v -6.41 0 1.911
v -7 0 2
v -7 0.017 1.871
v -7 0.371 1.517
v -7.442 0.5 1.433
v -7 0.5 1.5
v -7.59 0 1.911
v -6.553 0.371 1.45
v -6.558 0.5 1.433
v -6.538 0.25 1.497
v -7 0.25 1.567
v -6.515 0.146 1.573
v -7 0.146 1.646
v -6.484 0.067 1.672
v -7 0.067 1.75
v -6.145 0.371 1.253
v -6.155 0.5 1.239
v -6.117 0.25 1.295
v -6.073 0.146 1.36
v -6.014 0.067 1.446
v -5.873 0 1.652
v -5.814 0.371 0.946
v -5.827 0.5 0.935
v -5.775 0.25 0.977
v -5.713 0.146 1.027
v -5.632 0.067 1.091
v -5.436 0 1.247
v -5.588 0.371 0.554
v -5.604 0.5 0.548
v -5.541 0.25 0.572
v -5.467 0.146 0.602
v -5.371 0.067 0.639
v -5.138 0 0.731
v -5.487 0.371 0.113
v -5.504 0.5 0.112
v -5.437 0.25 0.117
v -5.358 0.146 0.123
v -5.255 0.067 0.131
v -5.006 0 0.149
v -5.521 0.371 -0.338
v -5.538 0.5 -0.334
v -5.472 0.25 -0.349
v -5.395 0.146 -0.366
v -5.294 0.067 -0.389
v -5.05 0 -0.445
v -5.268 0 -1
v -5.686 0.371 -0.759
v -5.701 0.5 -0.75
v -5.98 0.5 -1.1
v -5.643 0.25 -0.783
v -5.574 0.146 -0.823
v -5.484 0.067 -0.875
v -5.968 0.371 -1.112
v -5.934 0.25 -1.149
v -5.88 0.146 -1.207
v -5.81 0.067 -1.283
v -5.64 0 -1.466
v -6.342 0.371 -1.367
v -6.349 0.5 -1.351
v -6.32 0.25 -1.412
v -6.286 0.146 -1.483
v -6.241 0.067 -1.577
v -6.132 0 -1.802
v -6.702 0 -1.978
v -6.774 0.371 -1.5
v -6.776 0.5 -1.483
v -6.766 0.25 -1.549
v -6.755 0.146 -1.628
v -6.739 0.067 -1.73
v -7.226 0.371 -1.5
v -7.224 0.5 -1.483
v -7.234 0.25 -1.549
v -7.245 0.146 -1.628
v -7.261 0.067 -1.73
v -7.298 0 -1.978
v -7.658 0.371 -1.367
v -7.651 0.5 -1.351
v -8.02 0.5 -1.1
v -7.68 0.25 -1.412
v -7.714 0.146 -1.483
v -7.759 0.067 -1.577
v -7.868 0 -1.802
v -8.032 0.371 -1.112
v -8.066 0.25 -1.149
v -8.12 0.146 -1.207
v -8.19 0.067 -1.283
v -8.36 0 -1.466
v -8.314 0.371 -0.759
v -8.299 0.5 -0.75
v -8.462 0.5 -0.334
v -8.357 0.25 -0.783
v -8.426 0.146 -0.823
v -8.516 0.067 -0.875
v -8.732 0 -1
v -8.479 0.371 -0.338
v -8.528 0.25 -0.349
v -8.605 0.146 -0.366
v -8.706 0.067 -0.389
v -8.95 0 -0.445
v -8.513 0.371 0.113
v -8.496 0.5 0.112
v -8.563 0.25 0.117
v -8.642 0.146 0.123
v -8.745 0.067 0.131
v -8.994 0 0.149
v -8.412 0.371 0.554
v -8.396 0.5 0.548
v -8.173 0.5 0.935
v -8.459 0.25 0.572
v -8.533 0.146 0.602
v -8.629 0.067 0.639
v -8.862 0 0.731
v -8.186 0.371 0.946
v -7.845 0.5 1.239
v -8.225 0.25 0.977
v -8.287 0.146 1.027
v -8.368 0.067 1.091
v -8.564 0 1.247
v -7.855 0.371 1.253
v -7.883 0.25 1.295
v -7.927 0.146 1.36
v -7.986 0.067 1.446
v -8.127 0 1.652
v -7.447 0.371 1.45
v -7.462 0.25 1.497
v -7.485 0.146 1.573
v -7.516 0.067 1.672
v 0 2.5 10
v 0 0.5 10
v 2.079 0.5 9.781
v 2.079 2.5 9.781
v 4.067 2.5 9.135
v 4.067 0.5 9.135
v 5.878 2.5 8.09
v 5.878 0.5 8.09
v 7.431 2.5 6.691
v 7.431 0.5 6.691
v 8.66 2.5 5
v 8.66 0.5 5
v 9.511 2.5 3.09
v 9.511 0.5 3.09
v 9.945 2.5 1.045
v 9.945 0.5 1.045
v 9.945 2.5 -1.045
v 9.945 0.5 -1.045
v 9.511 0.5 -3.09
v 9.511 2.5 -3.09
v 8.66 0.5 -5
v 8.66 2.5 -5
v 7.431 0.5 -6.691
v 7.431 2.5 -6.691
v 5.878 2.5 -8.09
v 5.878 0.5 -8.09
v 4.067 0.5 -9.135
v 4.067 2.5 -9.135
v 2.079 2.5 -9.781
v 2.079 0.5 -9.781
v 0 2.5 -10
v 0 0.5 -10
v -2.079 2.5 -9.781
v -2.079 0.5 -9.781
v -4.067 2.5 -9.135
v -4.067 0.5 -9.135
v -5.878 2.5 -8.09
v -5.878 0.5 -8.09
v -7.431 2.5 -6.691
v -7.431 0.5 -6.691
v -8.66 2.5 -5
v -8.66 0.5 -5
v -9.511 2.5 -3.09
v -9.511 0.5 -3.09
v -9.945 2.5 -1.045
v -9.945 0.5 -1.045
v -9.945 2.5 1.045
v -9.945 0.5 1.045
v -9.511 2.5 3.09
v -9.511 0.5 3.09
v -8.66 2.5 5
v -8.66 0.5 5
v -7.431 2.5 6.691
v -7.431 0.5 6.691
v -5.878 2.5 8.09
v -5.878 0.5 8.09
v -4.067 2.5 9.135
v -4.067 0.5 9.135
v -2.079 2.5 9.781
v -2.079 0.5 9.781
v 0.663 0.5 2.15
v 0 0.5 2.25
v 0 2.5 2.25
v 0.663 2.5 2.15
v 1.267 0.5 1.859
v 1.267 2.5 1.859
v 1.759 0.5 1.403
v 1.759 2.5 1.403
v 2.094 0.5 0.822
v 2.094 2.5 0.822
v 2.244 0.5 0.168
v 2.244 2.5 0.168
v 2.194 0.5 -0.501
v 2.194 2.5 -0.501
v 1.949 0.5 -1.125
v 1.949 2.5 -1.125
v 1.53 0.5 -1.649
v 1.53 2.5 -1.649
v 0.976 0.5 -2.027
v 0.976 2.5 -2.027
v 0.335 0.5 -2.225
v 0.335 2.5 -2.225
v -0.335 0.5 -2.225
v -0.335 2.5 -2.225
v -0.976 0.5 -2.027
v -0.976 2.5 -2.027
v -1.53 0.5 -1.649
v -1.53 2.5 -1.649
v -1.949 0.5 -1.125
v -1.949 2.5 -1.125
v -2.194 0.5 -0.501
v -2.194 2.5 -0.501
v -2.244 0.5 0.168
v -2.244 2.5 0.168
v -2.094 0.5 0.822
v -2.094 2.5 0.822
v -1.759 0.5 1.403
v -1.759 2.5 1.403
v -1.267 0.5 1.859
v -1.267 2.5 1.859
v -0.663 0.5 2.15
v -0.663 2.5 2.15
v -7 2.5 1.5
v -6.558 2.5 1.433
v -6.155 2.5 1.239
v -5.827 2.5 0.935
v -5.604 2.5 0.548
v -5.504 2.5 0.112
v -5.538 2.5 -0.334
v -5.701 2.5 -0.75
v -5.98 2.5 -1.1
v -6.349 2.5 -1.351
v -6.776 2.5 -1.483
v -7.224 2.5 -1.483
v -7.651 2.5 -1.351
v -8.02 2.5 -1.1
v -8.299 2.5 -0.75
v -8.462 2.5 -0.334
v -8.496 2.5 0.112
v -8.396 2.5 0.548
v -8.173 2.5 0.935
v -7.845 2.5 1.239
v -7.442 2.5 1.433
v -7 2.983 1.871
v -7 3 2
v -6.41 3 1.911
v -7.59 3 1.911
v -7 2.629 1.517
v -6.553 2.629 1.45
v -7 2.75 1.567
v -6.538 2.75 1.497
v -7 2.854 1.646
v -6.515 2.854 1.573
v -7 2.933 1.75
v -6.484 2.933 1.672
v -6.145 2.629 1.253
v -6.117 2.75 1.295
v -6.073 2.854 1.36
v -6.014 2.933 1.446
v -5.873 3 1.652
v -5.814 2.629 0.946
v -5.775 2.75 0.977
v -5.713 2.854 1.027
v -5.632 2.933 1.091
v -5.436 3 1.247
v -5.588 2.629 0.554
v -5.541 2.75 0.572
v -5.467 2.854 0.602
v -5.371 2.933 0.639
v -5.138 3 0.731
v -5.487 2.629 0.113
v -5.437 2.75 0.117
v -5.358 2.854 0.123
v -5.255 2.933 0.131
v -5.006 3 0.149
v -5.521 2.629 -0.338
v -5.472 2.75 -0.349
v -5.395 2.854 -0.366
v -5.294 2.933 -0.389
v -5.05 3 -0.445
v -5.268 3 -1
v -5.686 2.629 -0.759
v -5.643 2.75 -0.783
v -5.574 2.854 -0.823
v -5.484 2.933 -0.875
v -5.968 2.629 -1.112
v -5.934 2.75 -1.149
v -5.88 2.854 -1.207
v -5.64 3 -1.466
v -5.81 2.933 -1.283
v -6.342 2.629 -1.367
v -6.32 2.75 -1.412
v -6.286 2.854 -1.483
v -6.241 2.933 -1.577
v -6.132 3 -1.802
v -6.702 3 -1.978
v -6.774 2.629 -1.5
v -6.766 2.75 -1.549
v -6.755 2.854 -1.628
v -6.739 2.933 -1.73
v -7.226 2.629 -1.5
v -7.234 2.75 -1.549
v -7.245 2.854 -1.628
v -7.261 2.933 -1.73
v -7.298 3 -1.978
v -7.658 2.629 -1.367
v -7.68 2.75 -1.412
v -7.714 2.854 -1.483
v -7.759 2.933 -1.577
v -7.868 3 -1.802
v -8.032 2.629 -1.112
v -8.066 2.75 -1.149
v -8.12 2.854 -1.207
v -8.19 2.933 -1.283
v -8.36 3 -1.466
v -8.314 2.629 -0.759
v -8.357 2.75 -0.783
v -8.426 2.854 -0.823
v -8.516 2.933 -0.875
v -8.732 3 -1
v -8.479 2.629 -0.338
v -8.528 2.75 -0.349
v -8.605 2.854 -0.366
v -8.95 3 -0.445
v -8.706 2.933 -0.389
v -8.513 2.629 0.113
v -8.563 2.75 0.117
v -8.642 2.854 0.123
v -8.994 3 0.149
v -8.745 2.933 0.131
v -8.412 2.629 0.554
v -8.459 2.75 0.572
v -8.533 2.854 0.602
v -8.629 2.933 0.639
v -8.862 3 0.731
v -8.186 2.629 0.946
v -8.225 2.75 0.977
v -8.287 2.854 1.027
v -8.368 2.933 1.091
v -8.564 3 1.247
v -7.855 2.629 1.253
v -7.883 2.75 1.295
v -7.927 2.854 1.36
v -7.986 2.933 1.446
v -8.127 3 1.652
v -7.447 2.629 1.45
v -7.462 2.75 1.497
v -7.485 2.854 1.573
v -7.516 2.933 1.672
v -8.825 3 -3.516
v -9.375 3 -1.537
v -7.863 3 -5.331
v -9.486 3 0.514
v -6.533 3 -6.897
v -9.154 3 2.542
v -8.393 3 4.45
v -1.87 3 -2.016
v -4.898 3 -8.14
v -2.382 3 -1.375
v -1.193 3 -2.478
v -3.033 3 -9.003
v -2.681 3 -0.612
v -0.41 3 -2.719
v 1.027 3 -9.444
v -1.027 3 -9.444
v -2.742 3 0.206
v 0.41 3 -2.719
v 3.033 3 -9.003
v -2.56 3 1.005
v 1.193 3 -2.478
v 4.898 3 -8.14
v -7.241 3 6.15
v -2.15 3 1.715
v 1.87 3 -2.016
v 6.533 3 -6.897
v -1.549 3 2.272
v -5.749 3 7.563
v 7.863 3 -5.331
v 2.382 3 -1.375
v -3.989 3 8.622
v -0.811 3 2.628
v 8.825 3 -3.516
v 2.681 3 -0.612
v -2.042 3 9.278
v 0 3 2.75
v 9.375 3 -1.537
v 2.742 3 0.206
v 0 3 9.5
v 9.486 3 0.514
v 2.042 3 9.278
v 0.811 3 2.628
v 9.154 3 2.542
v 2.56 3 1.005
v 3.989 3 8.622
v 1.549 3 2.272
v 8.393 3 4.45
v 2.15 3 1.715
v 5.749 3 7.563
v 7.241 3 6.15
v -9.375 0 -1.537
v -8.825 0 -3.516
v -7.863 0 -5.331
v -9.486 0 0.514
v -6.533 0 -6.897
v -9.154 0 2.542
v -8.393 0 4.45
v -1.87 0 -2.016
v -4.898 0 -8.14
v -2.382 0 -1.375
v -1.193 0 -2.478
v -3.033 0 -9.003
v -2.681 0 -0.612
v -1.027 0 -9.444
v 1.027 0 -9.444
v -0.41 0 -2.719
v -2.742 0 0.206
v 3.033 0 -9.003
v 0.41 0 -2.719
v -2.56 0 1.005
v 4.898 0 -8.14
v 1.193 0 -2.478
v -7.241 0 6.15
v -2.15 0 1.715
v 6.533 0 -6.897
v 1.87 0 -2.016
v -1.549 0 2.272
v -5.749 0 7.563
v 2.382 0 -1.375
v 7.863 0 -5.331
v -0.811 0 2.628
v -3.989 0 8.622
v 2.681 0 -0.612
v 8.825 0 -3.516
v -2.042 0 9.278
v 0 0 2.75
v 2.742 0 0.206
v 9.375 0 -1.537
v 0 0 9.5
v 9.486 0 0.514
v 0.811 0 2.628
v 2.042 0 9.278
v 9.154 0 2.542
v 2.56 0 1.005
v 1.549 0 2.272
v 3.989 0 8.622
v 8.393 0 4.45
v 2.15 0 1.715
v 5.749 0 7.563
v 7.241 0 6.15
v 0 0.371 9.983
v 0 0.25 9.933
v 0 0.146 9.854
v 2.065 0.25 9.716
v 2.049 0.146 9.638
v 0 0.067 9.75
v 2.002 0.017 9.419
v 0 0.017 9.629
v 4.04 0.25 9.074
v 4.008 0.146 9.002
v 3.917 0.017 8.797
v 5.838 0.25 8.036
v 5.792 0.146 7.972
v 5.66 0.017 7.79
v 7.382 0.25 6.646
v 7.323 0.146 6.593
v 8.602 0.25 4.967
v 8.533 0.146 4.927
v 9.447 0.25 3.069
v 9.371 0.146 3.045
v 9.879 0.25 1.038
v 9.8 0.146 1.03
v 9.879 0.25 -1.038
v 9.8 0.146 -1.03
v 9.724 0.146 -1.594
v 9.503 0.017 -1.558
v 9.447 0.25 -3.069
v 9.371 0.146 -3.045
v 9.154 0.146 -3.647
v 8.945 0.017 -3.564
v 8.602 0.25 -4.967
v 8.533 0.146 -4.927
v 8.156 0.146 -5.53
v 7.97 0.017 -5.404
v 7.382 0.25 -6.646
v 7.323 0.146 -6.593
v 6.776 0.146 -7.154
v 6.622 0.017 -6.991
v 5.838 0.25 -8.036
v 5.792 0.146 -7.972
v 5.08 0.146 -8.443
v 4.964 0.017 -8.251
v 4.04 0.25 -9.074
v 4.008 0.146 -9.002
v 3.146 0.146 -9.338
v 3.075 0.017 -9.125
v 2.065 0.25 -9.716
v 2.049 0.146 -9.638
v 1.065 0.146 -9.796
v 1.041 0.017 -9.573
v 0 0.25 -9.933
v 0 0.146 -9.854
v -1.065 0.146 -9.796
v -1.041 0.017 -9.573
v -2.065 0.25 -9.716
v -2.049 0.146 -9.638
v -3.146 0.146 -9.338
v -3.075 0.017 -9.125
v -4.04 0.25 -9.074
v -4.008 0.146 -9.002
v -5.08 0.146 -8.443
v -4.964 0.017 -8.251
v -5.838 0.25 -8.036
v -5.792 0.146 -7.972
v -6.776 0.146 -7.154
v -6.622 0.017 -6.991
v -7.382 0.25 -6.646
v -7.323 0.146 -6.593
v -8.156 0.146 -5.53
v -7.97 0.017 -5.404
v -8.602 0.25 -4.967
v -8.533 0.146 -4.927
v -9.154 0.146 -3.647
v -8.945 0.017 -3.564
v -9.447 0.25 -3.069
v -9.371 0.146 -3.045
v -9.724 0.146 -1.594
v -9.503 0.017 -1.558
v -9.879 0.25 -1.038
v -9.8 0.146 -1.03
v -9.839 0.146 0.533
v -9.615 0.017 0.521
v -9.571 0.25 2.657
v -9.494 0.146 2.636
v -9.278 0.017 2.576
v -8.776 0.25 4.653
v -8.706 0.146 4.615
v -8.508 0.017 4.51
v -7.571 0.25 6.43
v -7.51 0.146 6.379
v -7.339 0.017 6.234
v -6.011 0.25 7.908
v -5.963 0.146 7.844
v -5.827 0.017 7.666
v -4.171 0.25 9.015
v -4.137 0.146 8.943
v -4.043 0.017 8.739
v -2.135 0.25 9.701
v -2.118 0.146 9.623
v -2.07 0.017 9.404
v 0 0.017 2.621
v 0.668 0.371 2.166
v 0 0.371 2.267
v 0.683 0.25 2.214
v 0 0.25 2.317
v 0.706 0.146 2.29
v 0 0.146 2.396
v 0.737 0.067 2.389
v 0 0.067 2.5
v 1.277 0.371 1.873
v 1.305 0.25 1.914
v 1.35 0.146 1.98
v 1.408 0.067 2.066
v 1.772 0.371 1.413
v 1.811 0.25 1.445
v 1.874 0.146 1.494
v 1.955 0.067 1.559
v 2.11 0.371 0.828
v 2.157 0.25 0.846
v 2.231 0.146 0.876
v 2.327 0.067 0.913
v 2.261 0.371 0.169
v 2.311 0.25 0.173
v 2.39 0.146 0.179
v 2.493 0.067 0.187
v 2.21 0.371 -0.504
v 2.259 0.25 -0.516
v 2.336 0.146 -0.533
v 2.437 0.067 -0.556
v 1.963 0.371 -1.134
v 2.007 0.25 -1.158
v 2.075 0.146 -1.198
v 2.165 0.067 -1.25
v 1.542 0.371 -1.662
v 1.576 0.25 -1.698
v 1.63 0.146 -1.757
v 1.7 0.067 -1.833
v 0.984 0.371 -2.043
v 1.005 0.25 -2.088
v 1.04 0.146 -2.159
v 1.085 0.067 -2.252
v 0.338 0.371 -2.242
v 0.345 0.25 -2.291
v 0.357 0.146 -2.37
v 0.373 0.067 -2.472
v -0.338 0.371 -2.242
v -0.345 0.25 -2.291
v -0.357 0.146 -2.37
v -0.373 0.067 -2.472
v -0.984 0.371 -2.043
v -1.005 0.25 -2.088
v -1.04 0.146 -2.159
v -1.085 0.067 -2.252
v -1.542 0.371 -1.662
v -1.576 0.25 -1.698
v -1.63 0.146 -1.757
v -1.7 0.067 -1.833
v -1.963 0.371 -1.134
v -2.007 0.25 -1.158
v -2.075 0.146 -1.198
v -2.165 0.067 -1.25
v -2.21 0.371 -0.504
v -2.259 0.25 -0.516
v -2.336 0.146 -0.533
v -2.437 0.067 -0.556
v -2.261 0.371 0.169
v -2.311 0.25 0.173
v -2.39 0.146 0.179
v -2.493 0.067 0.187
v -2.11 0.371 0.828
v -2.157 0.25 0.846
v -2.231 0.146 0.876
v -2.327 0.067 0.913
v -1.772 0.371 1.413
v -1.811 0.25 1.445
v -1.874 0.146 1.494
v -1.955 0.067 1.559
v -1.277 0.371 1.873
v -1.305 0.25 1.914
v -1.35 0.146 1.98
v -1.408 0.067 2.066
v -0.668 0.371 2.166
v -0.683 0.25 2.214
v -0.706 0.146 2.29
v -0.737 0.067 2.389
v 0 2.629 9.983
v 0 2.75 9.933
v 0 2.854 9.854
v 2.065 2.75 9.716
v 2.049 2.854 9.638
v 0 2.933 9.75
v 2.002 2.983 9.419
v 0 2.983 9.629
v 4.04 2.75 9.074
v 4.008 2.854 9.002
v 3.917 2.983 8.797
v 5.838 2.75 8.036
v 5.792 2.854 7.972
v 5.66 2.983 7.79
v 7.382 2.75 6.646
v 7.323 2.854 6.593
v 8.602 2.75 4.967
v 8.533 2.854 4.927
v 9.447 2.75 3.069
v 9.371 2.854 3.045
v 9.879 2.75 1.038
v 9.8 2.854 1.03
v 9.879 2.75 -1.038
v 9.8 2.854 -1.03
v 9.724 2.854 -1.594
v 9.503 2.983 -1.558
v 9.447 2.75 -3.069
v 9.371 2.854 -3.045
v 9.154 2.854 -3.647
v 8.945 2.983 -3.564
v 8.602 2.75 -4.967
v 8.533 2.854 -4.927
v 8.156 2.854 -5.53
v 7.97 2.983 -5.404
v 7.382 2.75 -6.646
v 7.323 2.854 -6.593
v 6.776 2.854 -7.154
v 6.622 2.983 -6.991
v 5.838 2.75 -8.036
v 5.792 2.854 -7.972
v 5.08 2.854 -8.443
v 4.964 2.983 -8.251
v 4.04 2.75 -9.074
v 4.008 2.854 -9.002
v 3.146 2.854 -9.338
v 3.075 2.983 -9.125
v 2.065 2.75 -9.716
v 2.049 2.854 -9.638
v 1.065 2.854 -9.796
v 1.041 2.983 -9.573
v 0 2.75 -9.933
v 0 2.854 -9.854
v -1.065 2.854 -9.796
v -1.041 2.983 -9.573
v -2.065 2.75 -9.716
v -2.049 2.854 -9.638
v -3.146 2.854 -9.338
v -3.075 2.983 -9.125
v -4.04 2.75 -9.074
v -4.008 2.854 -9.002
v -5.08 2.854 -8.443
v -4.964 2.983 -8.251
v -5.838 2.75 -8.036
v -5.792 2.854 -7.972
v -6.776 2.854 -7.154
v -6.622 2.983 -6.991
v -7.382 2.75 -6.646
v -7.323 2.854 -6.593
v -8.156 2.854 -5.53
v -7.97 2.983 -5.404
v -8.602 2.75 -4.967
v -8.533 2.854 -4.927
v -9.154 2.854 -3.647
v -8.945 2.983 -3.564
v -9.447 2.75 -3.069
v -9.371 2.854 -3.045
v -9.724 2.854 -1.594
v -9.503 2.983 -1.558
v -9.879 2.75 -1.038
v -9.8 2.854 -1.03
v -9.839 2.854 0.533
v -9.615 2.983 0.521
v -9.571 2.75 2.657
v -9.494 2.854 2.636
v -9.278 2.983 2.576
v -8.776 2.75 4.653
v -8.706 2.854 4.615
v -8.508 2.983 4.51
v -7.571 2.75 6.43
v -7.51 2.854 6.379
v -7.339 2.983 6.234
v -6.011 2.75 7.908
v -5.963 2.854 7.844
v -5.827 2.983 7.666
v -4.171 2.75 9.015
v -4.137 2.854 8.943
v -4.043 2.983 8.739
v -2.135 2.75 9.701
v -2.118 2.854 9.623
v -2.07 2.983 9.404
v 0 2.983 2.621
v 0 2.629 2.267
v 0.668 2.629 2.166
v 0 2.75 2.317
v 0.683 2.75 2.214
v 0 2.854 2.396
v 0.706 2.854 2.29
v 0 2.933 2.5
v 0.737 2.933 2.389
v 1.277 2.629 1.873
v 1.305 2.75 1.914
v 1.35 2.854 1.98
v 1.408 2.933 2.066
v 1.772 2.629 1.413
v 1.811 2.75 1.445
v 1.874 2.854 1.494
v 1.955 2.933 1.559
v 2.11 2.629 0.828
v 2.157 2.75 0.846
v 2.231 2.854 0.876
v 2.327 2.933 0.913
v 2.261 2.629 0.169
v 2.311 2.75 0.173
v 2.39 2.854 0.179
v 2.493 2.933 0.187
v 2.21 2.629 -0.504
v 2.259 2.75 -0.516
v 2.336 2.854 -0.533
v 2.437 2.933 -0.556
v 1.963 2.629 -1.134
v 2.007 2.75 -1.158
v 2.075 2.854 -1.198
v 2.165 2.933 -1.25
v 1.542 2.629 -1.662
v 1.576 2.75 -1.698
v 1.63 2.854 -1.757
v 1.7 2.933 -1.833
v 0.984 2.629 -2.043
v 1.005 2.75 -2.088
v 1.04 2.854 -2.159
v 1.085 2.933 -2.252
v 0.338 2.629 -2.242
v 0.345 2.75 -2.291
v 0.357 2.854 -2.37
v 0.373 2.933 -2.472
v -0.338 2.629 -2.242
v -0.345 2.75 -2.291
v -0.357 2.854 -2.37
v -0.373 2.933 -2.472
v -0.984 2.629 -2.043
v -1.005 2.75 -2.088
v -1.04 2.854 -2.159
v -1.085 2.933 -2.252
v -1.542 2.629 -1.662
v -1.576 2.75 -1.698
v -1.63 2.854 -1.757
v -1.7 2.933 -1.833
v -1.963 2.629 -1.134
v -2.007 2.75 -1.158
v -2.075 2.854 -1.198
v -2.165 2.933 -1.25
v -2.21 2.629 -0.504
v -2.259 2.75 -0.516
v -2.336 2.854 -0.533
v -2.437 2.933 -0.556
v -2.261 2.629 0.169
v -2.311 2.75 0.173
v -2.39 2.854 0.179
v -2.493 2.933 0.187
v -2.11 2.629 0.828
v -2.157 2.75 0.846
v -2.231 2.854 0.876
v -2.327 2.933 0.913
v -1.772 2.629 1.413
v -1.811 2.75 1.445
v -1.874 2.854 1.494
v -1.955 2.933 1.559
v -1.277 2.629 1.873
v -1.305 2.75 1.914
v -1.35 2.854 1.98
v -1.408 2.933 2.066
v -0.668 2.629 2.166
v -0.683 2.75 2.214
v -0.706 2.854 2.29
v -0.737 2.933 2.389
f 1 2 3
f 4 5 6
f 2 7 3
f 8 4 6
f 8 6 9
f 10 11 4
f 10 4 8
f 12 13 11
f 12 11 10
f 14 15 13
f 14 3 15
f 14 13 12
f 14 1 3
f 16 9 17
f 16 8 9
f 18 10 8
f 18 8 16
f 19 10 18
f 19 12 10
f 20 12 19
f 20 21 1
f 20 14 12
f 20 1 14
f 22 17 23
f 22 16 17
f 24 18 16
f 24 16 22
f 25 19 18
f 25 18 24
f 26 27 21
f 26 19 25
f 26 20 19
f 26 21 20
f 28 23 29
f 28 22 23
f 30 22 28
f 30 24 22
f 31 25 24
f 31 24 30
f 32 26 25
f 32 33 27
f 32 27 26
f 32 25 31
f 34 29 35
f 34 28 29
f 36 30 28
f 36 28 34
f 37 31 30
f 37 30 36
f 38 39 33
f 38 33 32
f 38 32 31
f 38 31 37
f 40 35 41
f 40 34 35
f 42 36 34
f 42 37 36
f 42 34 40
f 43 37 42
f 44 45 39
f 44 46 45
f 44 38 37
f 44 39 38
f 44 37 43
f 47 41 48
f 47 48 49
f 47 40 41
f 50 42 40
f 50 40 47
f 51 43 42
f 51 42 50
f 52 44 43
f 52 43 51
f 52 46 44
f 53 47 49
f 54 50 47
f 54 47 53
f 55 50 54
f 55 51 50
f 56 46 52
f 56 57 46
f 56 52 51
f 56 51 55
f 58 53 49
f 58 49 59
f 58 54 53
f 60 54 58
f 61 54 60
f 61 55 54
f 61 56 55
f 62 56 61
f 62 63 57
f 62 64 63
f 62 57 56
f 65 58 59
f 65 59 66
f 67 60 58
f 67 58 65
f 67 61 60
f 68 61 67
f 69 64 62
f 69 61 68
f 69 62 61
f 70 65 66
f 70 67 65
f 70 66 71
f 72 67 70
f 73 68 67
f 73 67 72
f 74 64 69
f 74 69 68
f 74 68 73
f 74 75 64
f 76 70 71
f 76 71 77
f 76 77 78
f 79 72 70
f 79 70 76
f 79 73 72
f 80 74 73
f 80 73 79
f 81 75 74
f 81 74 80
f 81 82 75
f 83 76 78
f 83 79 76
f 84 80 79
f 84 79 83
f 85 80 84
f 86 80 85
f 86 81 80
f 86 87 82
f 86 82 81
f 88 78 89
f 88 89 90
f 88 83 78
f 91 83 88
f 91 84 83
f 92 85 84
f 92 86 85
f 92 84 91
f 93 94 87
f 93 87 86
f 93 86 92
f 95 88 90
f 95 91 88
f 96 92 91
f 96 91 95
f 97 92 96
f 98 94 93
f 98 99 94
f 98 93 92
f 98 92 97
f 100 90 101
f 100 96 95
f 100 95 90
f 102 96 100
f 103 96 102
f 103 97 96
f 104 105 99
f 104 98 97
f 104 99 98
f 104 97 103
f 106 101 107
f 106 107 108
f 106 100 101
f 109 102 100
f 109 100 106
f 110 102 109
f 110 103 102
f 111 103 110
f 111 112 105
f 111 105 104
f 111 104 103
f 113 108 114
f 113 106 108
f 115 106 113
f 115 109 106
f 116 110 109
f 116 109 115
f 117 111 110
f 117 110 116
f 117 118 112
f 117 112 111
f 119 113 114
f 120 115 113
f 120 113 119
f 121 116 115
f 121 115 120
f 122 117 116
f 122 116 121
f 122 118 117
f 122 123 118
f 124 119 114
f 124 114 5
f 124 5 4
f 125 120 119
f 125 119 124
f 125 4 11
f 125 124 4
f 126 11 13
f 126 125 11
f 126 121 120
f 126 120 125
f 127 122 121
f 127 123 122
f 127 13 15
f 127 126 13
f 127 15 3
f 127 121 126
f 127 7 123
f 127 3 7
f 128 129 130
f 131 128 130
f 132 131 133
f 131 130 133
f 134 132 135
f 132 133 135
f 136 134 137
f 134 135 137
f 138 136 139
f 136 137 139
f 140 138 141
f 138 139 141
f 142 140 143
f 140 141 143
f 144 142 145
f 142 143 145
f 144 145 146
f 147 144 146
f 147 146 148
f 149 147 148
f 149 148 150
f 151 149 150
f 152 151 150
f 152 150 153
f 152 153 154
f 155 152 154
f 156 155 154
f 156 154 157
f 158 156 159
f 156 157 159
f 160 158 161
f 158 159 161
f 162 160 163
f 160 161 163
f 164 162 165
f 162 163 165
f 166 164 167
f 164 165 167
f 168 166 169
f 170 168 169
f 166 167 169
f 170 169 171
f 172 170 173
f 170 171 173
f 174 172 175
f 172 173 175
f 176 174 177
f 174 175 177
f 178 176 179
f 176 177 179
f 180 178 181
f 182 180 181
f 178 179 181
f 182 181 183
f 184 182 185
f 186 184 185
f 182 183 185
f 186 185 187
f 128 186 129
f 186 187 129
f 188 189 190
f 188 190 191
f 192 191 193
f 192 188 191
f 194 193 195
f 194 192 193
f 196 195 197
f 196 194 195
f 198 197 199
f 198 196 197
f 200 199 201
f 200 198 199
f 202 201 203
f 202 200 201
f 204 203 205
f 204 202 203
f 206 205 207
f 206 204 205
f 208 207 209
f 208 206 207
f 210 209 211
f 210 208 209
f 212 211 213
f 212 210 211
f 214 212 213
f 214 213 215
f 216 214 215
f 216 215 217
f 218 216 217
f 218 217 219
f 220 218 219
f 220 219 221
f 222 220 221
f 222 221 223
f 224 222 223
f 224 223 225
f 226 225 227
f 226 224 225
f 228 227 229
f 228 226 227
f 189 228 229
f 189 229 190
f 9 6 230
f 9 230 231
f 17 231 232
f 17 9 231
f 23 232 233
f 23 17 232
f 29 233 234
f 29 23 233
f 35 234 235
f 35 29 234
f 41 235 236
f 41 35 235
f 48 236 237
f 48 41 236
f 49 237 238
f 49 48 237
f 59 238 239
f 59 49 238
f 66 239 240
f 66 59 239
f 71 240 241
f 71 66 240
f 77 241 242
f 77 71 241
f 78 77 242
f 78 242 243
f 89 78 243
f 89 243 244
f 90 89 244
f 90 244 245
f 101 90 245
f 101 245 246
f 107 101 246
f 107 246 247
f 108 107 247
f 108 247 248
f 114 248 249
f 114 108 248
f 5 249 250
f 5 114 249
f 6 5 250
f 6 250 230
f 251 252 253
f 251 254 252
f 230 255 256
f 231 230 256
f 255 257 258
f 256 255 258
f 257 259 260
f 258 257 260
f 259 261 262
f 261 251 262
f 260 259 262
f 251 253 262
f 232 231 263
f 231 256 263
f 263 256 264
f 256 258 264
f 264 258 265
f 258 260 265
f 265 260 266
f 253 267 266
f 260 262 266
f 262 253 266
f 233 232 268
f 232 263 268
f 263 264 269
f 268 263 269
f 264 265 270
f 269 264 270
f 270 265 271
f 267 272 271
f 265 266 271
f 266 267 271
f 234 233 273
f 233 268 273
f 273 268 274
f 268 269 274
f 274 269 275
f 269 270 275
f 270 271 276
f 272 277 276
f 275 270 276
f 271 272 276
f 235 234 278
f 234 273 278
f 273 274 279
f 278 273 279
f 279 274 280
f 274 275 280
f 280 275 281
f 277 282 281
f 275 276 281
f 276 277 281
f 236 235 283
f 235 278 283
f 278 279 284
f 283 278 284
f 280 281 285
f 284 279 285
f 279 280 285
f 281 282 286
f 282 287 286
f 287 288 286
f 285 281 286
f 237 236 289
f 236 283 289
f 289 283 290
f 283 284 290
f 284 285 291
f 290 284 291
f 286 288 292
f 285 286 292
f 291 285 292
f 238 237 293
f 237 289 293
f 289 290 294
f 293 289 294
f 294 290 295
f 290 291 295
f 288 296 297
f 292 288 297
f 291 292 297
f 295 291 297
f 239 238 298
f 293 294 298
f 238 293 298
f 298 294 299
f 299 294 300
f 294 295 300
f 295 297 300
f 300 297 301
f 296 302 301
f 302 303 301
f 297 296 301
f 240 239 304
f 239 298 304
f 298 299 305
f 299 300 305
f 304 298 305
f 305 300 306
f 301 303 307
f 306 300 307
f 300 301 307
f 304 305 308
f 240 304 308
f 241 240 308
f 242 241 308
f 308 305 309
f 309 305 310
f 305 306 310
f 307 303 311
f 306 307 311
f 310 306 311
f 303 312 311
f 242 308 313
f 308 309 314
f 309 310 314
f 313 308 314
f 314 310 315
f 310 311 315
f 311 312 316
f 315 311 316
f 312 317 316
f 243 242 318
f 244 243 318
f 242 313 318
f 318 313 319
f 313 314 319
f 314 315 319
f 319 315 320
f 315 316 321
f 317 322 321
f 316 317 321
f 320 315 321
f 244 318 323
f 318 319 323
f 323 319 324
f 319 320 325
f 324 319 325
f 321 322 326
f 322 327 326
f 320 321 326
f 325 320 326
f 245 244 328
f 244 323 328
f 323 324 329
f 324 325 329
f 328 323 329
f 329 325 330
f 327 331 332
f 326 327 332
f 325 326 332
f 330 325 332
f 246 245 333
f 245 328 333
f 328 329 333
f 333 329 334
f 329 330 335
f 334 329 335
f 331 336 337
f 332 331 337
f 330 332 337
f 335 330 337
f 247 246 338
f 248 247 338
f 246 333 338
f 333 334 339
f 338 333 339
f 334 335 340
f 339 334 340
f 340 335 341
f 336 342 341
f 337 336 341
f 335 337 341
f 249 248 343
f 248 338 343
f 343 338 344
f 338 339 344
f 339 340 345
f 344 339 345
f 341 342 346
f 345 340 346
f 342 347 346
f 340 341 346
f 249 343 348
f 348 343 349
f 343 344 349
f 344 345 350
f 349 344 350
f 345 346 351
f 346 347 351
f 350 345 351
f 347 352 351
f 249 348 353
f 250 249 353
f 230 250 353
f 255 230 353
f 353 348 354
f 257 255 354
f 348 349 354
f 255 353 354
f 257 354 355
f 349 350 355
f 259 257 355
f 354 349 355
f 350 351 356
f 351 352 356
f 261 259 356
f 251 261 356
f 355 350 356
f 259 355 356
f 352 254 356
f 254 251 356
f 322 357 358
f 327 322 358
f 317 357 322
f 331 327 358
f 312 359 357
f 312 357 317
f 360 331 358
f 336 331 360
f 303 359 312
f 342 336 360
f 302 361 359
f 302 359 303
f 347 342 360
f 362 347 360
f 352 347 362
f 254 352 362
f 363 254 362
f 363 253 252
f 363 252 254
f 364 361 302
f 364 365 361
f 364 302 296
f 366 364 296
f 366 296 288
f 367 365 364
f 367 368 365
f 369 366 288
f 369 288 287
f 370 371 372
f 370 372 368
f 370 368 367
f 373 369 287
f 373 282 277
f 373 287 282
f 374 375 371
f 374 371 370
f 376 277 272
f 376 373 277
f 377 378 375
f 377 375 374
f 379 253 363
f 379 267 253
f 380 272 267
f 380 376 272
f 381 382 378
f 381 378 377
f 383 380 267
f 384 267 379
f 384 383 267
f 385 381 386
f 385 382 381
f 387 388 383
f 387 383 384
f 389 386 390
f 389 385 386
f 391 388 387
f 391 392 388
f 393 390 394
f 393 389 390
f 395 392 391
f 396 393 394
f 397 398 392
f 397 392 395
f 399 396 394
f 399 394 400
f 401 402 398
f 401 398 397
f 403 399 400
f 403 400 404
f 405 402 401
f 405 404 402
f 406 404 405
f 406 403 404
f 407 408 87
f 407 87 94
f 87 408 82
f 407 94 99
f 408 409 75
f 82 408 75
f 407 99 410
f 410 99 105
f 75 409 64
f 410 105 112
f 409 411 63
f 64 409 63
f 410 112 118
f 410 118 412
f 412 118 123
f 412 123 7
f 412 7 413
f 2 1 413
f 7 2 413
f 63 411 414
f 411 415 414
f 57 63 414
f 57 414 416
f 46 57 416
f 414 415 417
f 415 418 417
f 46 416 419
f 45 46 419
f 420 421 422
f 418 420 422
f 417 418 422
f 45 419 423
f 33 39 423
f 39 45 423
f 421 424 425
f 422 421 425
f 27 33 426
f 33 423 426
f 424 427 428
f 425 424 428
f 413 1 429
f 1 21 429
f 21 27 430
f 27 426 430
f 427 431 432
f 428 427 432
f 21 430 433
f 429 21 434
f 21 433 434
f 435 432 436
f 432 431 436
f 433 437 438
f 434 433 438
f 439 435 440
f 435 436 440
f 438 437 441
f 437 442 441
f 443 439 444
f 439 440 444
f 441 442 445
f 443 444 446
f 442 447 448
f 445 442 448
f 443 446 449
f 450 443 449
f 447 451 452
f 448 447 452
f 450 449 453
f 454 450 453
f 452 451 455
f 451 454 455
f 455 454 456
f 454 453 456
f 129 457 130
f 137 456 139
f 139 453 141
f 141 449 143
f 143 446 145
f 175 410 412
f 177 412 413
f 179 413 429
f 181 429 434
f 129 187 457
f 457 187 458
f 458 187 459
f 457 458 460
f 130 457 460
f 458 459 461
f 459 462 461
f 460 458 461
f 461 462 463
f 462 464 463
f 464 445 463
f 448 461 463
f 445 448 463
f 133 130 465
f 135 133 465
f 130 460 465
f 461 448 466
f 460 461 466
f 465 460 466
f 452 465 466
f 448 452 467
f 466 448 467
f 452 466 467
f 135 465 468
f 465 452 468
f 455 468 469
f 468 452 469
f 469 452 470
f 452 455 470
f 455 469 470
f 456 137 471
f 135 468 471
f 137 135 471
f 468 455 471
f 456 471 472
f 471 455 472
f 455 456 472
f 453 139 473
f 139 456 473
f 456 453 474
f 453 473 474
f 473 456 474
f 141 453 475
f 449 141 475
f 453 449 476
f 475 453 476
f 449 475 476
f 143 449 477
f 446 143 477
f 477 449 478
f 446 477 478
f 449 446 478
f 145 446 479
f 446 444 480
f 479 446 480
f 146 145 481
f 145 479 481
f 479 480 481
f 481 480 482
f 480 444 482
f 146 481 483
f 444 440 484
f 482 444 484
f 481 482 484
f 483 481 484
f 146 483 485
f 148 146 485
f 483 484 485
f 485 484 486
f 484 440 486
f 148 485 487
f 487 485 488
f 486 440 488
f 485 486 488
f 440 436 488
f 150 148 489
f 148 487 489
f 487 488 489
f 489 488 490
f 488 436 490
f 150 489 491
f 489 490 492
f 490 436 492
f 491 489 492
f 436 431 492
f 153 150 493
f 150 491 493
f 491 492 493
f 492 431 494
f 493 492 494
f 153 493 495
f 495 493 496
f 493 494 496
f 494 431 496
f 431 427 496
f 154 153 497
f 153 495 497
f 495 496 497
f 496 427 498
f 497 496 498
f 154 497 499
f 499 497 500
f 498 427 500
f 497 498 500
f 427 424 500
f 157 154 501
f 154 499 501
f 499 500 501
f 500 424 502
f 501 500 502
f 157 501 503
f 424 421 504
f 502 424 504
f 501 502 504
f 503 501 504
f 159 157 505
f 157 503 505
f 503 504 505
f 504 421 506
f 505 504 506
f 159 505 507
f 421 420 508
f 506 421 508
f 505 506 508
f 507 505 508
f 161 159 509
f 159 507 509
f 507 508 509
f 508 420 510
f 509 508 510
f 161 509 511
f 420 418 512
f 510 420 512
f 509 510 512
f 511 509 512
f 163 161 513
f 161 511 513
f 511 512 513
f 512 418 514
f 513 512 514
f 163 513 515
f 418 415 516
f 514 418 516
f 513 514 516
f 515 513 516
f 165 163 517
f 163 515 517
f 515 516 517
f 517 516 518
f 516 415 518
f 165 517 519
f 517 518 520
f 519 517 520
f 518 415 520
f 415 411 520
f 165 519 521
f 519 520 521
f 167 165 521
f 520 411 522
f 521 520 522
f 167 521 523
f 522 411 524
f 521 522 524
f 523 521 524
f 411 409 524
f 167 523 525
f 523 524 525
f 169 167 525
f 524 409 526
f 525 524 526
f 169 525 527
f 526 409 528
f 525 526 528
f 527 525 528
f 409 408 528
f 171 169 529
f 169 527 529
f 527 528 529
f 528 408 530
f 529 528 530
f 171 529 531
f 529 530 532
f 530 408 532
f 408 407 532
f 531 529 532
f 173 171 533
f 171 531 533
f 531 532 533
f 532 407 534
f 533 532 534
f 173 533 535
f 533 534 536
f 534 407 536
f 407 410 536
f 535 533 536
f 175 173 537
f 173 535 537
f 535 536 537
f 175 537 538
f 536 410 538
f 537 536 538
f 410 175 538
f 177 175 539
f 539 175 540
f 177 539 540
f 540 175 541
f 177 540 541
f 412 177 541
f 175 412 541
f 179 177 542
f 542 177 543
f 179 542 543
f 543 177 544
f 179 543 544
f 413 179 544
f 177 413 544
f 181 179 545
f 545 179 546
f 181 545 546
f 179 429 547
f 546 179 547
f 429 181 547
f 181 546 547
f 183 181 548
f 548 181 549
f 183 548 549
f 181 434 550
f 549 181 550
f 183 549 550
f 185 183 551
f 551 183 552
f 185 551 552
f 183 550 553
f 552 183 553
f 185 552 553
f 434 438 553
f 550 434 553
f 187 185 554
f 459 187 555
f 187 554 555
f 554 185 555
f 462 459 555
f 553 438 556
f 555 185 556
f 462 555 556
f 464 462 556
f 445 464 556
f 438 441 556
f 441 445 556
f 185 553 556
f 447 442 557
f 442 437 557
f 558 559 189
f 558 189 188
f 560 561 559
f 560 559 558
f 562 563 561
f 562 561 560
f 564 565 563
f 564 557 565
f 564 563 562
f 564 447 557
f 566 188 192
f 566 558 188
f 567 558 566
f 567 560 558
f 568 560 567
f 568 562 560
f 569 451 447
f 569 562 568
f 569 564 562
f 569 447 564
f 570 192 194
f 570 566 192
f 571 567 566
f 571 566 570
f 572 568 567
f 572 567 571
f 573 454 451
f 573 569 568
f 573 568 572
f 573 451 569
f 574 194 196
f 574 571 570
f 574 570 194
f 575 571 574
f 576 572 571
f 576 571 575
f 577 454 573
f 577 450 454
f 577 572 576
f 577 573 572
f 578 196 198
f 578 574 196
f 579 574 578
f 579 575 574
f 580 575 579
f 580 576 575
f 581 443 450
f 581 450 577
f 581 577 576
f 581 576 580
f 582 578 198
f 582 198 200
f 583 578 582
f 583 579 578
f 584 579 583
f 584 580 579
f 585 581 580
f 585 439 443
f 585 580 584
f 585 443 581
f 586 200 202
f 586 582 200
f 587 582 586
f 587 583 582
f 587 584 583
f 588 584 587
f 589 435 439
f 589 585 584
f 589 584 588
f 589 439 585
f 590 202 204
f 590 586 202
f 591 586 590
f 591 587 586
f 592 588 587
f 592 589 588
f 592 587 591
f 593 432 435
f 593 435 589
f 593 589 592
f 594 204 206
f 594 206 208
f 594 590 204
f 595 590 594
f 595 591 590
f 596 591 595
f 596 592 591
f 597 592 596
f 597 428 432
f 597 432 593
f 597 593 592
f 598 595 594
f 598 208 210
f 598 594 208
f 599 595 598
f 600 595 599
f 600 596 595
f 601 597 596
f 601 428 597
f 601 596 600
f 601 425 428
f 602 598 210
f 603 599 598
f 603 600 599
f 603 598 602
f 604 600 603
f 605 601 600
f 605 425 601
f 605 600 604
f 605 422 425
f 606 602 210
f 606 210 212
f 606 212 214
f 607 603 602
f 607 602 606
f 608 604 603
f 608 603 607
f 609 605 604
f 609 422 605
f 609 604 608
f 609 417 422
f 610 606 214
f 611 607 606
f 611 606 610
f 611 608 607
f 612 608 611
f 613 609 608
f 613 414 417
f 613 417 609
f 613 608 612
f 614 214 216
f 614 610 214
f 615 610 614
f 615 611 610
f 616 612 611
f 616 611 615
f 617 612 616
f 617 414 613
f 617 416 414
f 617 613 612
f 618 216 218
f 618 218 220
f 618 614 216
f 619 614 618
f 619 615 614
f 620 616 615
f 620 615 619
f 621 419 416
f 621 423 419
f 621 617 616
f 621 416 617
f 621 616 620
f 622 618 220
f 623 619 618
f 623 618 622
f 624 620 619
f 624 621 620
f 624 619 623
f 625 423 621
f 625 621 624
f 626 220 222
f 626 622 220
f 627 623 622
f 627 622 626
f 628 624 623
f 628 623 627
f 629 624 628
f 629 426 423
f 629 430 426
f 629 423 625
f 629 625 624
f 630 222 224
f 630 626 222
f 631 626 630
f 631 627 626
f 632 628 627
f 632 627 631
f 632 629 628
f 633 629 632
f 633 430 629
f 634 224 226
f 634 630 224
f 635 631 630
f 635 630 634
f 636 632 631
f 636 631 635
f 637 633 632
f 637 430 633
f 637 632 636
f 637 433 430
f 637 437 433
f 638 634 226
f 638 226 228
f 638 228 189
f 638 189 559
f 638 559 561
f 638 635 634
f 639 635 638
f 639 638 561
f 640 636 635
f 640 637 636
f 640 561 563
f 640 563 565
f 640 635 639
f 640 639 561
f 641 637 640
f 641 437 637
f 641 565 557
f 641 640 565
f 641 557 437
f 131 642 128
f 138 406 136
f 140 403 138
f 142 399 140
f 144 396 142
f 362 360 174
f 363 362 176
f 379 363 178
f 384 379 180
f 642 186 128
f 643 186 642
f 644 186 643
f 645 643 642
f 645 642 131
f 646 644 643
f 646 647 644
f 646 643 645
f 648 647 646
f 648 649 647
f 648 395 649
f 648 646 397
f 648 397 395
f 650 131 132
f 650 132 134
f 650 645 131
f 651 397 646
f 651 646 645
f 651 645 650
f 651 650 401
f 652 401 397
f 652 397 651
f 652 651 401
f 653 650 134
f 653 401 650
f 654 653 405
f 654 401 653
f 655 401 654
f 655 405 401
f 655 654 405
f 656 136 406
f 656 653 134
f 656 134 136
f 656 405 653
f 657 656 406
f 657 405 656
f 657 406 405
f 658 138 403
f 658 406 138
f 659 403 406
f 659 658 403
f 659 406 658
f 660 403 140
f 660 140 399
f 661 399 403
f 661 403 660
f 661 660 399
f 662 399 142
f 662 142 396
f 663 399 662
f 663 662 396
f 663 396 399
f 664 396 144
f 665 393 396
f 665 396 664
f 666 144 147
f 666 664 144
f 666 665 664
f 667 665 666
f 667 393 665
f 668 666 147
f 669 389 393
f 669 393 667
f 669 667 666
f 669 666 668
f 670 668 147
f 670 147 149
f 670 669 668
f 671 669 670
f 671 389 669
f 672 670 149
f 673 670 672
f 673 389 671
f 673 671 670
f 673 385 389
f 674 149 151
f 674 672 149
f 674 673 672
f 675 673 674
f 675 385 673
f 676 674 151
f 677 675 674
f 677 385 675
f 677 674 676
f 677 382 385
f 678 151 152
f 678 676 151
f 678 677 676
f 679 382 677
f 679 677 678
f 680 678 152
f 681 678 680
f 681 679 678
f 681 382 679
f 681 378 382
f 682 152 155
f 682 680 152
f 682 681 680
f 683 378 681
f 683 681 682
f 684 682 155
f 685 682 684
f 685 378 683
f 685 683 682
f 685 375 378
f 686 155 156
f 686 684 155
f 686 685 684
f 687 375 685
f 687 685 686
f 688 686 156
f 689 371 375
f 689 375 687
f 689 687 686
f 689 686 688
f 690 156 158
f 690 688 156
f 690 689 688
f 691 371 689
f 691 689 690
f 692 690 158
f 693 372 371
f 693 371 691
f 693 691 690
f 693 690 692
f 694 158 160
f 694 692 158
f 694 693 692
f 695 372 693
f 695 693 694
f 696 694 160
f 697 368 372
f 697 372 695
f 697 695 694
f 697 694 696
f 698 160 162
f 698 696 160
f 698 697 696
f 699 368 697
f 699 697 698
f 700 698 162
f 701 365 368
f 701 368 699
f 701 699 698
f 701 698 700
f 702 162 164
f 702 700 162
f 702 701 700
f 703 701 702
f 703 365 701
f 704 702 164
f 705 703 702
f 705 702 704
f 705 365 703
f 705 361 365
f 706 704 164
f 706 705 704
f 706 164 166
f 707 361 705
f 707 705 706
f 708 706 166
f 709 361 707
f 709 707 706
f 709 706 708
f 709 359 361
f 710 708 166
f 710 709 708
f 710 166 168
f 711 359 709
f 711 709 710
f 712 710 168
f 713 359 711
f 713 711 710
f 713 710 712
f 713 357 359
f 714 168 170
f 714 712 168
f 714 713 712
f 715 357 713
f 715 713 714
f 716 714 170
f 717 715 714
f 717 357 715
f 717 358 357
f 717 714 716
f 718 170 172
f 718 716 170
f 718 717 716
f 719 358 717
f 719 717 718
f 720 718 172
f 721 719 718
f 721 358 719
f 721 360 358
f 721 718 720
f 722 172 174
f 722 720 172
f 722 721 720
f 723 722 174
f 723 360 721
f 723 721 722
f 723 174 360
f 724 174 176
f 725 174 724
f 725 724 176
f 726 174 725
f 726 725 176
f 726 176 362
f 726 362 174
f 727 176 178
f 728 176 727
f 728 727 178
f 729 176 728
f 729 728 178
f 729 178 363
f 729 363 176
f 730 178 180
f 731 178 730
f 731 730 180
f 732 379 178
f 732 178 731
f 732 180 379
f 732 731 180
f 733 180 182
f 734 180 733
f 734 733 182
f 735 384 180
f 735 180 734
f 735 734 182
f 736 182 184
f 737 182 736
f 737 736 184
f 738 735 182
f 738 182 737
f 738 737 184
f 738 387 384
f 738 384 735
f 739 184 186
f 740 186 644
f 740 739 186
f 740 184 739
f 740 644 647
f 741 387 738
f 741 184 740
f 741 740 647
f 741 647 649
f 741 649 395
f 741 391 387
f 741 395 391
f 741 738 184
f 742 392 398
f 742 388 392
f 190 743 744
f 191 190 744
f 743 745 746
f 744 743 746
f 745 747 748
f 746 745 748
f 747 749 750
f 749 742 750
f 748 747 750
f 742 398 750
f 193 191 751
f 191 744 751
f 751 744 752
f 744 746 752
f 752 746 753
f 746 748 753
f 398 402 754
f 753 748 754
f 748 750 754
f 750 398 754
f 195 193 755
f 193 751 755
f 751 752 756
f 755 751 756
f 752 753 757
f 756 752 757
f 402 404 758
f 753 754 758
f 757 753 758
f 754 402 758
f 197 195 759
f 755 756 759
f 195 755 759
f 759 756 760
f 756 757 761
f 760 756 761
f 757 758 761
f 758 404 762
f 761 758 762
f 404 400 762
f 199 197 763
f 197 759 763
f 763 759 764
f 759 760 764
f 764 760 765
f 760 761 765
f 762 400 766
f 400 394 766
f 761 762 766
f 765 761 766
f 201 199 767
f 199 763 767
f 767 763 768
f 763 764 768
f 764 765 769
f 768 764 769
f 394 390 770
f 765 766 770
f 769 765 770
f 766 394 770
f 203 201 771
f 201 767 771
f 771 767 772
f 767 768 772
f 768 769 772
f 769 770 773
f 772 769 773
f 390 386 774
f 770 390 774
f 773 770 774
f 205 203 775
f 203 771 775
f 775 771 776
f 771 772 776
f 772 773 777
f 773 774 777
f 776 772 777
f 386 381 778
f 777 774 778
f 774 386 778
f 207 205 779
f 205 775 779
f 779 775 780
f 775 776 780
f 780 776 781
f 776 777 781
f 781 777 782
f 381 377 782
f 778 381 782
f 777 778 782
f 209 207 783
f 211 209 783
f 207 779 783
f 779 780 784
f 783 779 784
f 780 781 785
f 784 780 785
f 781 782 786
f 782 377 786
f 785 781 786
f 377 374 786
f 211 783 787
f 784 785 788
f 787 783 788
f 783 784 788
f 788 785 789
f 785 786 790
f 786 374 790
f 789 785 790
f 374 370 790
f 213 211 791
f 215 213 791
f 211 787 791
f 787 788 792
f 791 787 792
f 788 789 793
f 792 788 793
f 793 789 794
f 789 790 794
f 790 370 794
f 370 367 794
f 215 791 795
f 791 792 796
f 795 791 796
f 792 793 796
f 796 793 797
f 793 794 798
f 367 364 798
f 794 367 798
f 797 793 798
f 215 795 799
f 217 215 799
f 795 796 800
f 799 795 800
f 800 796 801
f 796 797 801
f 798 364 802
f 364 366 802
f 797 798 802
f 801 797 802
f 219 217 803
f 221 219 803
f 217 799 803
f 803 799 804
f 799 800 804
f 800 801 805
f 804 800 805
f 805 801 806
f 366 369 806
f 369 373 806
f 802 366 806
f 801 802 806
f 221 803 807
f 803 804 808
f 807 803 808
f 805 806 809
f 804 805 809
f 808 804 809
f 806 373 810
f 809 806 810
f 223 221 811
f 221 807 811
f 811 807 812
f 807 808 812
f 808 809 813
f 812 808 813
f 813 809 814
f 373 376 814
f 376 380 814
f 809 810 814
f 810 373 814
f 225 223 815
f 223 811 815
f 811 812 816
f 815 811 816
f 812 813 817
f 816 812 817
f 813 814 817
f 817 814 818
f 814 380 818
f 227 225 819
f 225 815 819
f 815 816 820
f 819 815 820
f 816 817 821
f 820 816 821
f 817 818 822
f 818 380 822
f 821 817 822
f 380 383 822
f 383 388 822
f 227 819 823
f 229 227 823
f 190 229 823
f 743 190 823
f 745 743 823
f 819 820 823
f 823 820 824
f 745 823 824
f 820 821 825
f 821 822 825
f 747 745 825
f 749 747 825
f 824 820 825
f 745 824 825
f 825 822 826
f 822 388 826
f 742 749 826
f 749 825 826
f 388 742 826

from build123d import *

# Parameters (mm, degrees)
SKETCH1_R           = 10
SKETCH1_R_2         = 2.25
SKETCH1_R_3         = 1.5
BOSS_EXTRUDE1_DEPTH = 3
FILLET1_R           = 0.5


with BuildPart() as part:
    # Sketch1 → Boss-Extrude1 (new body)
    with BuildSketch(Plane(origin=(0, 0, 0), x_dir=(1, 0, 0), z_dir=(0, 1, 0))):
        with Locations(Location((0, 0, 0), (0, 0, 270))):
            Circle(SKETCH1_R)
        with Locations(Location((0, 0, 0), (0, 0, 270))):
            Circle(SKETCH1_R_2, mode=Mode.SUBTRACT)
        with Locations(Location((-7, 0, 0), (0, 0, 270))):
            Circle(SKETCH1_R_3, mode=Mode.SUBTRACT)
    extrude(amount=BOSS_EXTRUDE1_DEPTH)

    # Fillet1
    fillet1_edges = [part.edges().sort_by_distance(p)[0] for p in [
        (0, 0, -10),
        (0, 3, -10),
        (0, 0, -2.25),
        (0, 3, -2.25),
        (-7, 0, -1.5),
        (-7, 3, -1.5),
    ]]
    fillet(fillet1_edges, radius=FILLET1_R)


solid = part.part
